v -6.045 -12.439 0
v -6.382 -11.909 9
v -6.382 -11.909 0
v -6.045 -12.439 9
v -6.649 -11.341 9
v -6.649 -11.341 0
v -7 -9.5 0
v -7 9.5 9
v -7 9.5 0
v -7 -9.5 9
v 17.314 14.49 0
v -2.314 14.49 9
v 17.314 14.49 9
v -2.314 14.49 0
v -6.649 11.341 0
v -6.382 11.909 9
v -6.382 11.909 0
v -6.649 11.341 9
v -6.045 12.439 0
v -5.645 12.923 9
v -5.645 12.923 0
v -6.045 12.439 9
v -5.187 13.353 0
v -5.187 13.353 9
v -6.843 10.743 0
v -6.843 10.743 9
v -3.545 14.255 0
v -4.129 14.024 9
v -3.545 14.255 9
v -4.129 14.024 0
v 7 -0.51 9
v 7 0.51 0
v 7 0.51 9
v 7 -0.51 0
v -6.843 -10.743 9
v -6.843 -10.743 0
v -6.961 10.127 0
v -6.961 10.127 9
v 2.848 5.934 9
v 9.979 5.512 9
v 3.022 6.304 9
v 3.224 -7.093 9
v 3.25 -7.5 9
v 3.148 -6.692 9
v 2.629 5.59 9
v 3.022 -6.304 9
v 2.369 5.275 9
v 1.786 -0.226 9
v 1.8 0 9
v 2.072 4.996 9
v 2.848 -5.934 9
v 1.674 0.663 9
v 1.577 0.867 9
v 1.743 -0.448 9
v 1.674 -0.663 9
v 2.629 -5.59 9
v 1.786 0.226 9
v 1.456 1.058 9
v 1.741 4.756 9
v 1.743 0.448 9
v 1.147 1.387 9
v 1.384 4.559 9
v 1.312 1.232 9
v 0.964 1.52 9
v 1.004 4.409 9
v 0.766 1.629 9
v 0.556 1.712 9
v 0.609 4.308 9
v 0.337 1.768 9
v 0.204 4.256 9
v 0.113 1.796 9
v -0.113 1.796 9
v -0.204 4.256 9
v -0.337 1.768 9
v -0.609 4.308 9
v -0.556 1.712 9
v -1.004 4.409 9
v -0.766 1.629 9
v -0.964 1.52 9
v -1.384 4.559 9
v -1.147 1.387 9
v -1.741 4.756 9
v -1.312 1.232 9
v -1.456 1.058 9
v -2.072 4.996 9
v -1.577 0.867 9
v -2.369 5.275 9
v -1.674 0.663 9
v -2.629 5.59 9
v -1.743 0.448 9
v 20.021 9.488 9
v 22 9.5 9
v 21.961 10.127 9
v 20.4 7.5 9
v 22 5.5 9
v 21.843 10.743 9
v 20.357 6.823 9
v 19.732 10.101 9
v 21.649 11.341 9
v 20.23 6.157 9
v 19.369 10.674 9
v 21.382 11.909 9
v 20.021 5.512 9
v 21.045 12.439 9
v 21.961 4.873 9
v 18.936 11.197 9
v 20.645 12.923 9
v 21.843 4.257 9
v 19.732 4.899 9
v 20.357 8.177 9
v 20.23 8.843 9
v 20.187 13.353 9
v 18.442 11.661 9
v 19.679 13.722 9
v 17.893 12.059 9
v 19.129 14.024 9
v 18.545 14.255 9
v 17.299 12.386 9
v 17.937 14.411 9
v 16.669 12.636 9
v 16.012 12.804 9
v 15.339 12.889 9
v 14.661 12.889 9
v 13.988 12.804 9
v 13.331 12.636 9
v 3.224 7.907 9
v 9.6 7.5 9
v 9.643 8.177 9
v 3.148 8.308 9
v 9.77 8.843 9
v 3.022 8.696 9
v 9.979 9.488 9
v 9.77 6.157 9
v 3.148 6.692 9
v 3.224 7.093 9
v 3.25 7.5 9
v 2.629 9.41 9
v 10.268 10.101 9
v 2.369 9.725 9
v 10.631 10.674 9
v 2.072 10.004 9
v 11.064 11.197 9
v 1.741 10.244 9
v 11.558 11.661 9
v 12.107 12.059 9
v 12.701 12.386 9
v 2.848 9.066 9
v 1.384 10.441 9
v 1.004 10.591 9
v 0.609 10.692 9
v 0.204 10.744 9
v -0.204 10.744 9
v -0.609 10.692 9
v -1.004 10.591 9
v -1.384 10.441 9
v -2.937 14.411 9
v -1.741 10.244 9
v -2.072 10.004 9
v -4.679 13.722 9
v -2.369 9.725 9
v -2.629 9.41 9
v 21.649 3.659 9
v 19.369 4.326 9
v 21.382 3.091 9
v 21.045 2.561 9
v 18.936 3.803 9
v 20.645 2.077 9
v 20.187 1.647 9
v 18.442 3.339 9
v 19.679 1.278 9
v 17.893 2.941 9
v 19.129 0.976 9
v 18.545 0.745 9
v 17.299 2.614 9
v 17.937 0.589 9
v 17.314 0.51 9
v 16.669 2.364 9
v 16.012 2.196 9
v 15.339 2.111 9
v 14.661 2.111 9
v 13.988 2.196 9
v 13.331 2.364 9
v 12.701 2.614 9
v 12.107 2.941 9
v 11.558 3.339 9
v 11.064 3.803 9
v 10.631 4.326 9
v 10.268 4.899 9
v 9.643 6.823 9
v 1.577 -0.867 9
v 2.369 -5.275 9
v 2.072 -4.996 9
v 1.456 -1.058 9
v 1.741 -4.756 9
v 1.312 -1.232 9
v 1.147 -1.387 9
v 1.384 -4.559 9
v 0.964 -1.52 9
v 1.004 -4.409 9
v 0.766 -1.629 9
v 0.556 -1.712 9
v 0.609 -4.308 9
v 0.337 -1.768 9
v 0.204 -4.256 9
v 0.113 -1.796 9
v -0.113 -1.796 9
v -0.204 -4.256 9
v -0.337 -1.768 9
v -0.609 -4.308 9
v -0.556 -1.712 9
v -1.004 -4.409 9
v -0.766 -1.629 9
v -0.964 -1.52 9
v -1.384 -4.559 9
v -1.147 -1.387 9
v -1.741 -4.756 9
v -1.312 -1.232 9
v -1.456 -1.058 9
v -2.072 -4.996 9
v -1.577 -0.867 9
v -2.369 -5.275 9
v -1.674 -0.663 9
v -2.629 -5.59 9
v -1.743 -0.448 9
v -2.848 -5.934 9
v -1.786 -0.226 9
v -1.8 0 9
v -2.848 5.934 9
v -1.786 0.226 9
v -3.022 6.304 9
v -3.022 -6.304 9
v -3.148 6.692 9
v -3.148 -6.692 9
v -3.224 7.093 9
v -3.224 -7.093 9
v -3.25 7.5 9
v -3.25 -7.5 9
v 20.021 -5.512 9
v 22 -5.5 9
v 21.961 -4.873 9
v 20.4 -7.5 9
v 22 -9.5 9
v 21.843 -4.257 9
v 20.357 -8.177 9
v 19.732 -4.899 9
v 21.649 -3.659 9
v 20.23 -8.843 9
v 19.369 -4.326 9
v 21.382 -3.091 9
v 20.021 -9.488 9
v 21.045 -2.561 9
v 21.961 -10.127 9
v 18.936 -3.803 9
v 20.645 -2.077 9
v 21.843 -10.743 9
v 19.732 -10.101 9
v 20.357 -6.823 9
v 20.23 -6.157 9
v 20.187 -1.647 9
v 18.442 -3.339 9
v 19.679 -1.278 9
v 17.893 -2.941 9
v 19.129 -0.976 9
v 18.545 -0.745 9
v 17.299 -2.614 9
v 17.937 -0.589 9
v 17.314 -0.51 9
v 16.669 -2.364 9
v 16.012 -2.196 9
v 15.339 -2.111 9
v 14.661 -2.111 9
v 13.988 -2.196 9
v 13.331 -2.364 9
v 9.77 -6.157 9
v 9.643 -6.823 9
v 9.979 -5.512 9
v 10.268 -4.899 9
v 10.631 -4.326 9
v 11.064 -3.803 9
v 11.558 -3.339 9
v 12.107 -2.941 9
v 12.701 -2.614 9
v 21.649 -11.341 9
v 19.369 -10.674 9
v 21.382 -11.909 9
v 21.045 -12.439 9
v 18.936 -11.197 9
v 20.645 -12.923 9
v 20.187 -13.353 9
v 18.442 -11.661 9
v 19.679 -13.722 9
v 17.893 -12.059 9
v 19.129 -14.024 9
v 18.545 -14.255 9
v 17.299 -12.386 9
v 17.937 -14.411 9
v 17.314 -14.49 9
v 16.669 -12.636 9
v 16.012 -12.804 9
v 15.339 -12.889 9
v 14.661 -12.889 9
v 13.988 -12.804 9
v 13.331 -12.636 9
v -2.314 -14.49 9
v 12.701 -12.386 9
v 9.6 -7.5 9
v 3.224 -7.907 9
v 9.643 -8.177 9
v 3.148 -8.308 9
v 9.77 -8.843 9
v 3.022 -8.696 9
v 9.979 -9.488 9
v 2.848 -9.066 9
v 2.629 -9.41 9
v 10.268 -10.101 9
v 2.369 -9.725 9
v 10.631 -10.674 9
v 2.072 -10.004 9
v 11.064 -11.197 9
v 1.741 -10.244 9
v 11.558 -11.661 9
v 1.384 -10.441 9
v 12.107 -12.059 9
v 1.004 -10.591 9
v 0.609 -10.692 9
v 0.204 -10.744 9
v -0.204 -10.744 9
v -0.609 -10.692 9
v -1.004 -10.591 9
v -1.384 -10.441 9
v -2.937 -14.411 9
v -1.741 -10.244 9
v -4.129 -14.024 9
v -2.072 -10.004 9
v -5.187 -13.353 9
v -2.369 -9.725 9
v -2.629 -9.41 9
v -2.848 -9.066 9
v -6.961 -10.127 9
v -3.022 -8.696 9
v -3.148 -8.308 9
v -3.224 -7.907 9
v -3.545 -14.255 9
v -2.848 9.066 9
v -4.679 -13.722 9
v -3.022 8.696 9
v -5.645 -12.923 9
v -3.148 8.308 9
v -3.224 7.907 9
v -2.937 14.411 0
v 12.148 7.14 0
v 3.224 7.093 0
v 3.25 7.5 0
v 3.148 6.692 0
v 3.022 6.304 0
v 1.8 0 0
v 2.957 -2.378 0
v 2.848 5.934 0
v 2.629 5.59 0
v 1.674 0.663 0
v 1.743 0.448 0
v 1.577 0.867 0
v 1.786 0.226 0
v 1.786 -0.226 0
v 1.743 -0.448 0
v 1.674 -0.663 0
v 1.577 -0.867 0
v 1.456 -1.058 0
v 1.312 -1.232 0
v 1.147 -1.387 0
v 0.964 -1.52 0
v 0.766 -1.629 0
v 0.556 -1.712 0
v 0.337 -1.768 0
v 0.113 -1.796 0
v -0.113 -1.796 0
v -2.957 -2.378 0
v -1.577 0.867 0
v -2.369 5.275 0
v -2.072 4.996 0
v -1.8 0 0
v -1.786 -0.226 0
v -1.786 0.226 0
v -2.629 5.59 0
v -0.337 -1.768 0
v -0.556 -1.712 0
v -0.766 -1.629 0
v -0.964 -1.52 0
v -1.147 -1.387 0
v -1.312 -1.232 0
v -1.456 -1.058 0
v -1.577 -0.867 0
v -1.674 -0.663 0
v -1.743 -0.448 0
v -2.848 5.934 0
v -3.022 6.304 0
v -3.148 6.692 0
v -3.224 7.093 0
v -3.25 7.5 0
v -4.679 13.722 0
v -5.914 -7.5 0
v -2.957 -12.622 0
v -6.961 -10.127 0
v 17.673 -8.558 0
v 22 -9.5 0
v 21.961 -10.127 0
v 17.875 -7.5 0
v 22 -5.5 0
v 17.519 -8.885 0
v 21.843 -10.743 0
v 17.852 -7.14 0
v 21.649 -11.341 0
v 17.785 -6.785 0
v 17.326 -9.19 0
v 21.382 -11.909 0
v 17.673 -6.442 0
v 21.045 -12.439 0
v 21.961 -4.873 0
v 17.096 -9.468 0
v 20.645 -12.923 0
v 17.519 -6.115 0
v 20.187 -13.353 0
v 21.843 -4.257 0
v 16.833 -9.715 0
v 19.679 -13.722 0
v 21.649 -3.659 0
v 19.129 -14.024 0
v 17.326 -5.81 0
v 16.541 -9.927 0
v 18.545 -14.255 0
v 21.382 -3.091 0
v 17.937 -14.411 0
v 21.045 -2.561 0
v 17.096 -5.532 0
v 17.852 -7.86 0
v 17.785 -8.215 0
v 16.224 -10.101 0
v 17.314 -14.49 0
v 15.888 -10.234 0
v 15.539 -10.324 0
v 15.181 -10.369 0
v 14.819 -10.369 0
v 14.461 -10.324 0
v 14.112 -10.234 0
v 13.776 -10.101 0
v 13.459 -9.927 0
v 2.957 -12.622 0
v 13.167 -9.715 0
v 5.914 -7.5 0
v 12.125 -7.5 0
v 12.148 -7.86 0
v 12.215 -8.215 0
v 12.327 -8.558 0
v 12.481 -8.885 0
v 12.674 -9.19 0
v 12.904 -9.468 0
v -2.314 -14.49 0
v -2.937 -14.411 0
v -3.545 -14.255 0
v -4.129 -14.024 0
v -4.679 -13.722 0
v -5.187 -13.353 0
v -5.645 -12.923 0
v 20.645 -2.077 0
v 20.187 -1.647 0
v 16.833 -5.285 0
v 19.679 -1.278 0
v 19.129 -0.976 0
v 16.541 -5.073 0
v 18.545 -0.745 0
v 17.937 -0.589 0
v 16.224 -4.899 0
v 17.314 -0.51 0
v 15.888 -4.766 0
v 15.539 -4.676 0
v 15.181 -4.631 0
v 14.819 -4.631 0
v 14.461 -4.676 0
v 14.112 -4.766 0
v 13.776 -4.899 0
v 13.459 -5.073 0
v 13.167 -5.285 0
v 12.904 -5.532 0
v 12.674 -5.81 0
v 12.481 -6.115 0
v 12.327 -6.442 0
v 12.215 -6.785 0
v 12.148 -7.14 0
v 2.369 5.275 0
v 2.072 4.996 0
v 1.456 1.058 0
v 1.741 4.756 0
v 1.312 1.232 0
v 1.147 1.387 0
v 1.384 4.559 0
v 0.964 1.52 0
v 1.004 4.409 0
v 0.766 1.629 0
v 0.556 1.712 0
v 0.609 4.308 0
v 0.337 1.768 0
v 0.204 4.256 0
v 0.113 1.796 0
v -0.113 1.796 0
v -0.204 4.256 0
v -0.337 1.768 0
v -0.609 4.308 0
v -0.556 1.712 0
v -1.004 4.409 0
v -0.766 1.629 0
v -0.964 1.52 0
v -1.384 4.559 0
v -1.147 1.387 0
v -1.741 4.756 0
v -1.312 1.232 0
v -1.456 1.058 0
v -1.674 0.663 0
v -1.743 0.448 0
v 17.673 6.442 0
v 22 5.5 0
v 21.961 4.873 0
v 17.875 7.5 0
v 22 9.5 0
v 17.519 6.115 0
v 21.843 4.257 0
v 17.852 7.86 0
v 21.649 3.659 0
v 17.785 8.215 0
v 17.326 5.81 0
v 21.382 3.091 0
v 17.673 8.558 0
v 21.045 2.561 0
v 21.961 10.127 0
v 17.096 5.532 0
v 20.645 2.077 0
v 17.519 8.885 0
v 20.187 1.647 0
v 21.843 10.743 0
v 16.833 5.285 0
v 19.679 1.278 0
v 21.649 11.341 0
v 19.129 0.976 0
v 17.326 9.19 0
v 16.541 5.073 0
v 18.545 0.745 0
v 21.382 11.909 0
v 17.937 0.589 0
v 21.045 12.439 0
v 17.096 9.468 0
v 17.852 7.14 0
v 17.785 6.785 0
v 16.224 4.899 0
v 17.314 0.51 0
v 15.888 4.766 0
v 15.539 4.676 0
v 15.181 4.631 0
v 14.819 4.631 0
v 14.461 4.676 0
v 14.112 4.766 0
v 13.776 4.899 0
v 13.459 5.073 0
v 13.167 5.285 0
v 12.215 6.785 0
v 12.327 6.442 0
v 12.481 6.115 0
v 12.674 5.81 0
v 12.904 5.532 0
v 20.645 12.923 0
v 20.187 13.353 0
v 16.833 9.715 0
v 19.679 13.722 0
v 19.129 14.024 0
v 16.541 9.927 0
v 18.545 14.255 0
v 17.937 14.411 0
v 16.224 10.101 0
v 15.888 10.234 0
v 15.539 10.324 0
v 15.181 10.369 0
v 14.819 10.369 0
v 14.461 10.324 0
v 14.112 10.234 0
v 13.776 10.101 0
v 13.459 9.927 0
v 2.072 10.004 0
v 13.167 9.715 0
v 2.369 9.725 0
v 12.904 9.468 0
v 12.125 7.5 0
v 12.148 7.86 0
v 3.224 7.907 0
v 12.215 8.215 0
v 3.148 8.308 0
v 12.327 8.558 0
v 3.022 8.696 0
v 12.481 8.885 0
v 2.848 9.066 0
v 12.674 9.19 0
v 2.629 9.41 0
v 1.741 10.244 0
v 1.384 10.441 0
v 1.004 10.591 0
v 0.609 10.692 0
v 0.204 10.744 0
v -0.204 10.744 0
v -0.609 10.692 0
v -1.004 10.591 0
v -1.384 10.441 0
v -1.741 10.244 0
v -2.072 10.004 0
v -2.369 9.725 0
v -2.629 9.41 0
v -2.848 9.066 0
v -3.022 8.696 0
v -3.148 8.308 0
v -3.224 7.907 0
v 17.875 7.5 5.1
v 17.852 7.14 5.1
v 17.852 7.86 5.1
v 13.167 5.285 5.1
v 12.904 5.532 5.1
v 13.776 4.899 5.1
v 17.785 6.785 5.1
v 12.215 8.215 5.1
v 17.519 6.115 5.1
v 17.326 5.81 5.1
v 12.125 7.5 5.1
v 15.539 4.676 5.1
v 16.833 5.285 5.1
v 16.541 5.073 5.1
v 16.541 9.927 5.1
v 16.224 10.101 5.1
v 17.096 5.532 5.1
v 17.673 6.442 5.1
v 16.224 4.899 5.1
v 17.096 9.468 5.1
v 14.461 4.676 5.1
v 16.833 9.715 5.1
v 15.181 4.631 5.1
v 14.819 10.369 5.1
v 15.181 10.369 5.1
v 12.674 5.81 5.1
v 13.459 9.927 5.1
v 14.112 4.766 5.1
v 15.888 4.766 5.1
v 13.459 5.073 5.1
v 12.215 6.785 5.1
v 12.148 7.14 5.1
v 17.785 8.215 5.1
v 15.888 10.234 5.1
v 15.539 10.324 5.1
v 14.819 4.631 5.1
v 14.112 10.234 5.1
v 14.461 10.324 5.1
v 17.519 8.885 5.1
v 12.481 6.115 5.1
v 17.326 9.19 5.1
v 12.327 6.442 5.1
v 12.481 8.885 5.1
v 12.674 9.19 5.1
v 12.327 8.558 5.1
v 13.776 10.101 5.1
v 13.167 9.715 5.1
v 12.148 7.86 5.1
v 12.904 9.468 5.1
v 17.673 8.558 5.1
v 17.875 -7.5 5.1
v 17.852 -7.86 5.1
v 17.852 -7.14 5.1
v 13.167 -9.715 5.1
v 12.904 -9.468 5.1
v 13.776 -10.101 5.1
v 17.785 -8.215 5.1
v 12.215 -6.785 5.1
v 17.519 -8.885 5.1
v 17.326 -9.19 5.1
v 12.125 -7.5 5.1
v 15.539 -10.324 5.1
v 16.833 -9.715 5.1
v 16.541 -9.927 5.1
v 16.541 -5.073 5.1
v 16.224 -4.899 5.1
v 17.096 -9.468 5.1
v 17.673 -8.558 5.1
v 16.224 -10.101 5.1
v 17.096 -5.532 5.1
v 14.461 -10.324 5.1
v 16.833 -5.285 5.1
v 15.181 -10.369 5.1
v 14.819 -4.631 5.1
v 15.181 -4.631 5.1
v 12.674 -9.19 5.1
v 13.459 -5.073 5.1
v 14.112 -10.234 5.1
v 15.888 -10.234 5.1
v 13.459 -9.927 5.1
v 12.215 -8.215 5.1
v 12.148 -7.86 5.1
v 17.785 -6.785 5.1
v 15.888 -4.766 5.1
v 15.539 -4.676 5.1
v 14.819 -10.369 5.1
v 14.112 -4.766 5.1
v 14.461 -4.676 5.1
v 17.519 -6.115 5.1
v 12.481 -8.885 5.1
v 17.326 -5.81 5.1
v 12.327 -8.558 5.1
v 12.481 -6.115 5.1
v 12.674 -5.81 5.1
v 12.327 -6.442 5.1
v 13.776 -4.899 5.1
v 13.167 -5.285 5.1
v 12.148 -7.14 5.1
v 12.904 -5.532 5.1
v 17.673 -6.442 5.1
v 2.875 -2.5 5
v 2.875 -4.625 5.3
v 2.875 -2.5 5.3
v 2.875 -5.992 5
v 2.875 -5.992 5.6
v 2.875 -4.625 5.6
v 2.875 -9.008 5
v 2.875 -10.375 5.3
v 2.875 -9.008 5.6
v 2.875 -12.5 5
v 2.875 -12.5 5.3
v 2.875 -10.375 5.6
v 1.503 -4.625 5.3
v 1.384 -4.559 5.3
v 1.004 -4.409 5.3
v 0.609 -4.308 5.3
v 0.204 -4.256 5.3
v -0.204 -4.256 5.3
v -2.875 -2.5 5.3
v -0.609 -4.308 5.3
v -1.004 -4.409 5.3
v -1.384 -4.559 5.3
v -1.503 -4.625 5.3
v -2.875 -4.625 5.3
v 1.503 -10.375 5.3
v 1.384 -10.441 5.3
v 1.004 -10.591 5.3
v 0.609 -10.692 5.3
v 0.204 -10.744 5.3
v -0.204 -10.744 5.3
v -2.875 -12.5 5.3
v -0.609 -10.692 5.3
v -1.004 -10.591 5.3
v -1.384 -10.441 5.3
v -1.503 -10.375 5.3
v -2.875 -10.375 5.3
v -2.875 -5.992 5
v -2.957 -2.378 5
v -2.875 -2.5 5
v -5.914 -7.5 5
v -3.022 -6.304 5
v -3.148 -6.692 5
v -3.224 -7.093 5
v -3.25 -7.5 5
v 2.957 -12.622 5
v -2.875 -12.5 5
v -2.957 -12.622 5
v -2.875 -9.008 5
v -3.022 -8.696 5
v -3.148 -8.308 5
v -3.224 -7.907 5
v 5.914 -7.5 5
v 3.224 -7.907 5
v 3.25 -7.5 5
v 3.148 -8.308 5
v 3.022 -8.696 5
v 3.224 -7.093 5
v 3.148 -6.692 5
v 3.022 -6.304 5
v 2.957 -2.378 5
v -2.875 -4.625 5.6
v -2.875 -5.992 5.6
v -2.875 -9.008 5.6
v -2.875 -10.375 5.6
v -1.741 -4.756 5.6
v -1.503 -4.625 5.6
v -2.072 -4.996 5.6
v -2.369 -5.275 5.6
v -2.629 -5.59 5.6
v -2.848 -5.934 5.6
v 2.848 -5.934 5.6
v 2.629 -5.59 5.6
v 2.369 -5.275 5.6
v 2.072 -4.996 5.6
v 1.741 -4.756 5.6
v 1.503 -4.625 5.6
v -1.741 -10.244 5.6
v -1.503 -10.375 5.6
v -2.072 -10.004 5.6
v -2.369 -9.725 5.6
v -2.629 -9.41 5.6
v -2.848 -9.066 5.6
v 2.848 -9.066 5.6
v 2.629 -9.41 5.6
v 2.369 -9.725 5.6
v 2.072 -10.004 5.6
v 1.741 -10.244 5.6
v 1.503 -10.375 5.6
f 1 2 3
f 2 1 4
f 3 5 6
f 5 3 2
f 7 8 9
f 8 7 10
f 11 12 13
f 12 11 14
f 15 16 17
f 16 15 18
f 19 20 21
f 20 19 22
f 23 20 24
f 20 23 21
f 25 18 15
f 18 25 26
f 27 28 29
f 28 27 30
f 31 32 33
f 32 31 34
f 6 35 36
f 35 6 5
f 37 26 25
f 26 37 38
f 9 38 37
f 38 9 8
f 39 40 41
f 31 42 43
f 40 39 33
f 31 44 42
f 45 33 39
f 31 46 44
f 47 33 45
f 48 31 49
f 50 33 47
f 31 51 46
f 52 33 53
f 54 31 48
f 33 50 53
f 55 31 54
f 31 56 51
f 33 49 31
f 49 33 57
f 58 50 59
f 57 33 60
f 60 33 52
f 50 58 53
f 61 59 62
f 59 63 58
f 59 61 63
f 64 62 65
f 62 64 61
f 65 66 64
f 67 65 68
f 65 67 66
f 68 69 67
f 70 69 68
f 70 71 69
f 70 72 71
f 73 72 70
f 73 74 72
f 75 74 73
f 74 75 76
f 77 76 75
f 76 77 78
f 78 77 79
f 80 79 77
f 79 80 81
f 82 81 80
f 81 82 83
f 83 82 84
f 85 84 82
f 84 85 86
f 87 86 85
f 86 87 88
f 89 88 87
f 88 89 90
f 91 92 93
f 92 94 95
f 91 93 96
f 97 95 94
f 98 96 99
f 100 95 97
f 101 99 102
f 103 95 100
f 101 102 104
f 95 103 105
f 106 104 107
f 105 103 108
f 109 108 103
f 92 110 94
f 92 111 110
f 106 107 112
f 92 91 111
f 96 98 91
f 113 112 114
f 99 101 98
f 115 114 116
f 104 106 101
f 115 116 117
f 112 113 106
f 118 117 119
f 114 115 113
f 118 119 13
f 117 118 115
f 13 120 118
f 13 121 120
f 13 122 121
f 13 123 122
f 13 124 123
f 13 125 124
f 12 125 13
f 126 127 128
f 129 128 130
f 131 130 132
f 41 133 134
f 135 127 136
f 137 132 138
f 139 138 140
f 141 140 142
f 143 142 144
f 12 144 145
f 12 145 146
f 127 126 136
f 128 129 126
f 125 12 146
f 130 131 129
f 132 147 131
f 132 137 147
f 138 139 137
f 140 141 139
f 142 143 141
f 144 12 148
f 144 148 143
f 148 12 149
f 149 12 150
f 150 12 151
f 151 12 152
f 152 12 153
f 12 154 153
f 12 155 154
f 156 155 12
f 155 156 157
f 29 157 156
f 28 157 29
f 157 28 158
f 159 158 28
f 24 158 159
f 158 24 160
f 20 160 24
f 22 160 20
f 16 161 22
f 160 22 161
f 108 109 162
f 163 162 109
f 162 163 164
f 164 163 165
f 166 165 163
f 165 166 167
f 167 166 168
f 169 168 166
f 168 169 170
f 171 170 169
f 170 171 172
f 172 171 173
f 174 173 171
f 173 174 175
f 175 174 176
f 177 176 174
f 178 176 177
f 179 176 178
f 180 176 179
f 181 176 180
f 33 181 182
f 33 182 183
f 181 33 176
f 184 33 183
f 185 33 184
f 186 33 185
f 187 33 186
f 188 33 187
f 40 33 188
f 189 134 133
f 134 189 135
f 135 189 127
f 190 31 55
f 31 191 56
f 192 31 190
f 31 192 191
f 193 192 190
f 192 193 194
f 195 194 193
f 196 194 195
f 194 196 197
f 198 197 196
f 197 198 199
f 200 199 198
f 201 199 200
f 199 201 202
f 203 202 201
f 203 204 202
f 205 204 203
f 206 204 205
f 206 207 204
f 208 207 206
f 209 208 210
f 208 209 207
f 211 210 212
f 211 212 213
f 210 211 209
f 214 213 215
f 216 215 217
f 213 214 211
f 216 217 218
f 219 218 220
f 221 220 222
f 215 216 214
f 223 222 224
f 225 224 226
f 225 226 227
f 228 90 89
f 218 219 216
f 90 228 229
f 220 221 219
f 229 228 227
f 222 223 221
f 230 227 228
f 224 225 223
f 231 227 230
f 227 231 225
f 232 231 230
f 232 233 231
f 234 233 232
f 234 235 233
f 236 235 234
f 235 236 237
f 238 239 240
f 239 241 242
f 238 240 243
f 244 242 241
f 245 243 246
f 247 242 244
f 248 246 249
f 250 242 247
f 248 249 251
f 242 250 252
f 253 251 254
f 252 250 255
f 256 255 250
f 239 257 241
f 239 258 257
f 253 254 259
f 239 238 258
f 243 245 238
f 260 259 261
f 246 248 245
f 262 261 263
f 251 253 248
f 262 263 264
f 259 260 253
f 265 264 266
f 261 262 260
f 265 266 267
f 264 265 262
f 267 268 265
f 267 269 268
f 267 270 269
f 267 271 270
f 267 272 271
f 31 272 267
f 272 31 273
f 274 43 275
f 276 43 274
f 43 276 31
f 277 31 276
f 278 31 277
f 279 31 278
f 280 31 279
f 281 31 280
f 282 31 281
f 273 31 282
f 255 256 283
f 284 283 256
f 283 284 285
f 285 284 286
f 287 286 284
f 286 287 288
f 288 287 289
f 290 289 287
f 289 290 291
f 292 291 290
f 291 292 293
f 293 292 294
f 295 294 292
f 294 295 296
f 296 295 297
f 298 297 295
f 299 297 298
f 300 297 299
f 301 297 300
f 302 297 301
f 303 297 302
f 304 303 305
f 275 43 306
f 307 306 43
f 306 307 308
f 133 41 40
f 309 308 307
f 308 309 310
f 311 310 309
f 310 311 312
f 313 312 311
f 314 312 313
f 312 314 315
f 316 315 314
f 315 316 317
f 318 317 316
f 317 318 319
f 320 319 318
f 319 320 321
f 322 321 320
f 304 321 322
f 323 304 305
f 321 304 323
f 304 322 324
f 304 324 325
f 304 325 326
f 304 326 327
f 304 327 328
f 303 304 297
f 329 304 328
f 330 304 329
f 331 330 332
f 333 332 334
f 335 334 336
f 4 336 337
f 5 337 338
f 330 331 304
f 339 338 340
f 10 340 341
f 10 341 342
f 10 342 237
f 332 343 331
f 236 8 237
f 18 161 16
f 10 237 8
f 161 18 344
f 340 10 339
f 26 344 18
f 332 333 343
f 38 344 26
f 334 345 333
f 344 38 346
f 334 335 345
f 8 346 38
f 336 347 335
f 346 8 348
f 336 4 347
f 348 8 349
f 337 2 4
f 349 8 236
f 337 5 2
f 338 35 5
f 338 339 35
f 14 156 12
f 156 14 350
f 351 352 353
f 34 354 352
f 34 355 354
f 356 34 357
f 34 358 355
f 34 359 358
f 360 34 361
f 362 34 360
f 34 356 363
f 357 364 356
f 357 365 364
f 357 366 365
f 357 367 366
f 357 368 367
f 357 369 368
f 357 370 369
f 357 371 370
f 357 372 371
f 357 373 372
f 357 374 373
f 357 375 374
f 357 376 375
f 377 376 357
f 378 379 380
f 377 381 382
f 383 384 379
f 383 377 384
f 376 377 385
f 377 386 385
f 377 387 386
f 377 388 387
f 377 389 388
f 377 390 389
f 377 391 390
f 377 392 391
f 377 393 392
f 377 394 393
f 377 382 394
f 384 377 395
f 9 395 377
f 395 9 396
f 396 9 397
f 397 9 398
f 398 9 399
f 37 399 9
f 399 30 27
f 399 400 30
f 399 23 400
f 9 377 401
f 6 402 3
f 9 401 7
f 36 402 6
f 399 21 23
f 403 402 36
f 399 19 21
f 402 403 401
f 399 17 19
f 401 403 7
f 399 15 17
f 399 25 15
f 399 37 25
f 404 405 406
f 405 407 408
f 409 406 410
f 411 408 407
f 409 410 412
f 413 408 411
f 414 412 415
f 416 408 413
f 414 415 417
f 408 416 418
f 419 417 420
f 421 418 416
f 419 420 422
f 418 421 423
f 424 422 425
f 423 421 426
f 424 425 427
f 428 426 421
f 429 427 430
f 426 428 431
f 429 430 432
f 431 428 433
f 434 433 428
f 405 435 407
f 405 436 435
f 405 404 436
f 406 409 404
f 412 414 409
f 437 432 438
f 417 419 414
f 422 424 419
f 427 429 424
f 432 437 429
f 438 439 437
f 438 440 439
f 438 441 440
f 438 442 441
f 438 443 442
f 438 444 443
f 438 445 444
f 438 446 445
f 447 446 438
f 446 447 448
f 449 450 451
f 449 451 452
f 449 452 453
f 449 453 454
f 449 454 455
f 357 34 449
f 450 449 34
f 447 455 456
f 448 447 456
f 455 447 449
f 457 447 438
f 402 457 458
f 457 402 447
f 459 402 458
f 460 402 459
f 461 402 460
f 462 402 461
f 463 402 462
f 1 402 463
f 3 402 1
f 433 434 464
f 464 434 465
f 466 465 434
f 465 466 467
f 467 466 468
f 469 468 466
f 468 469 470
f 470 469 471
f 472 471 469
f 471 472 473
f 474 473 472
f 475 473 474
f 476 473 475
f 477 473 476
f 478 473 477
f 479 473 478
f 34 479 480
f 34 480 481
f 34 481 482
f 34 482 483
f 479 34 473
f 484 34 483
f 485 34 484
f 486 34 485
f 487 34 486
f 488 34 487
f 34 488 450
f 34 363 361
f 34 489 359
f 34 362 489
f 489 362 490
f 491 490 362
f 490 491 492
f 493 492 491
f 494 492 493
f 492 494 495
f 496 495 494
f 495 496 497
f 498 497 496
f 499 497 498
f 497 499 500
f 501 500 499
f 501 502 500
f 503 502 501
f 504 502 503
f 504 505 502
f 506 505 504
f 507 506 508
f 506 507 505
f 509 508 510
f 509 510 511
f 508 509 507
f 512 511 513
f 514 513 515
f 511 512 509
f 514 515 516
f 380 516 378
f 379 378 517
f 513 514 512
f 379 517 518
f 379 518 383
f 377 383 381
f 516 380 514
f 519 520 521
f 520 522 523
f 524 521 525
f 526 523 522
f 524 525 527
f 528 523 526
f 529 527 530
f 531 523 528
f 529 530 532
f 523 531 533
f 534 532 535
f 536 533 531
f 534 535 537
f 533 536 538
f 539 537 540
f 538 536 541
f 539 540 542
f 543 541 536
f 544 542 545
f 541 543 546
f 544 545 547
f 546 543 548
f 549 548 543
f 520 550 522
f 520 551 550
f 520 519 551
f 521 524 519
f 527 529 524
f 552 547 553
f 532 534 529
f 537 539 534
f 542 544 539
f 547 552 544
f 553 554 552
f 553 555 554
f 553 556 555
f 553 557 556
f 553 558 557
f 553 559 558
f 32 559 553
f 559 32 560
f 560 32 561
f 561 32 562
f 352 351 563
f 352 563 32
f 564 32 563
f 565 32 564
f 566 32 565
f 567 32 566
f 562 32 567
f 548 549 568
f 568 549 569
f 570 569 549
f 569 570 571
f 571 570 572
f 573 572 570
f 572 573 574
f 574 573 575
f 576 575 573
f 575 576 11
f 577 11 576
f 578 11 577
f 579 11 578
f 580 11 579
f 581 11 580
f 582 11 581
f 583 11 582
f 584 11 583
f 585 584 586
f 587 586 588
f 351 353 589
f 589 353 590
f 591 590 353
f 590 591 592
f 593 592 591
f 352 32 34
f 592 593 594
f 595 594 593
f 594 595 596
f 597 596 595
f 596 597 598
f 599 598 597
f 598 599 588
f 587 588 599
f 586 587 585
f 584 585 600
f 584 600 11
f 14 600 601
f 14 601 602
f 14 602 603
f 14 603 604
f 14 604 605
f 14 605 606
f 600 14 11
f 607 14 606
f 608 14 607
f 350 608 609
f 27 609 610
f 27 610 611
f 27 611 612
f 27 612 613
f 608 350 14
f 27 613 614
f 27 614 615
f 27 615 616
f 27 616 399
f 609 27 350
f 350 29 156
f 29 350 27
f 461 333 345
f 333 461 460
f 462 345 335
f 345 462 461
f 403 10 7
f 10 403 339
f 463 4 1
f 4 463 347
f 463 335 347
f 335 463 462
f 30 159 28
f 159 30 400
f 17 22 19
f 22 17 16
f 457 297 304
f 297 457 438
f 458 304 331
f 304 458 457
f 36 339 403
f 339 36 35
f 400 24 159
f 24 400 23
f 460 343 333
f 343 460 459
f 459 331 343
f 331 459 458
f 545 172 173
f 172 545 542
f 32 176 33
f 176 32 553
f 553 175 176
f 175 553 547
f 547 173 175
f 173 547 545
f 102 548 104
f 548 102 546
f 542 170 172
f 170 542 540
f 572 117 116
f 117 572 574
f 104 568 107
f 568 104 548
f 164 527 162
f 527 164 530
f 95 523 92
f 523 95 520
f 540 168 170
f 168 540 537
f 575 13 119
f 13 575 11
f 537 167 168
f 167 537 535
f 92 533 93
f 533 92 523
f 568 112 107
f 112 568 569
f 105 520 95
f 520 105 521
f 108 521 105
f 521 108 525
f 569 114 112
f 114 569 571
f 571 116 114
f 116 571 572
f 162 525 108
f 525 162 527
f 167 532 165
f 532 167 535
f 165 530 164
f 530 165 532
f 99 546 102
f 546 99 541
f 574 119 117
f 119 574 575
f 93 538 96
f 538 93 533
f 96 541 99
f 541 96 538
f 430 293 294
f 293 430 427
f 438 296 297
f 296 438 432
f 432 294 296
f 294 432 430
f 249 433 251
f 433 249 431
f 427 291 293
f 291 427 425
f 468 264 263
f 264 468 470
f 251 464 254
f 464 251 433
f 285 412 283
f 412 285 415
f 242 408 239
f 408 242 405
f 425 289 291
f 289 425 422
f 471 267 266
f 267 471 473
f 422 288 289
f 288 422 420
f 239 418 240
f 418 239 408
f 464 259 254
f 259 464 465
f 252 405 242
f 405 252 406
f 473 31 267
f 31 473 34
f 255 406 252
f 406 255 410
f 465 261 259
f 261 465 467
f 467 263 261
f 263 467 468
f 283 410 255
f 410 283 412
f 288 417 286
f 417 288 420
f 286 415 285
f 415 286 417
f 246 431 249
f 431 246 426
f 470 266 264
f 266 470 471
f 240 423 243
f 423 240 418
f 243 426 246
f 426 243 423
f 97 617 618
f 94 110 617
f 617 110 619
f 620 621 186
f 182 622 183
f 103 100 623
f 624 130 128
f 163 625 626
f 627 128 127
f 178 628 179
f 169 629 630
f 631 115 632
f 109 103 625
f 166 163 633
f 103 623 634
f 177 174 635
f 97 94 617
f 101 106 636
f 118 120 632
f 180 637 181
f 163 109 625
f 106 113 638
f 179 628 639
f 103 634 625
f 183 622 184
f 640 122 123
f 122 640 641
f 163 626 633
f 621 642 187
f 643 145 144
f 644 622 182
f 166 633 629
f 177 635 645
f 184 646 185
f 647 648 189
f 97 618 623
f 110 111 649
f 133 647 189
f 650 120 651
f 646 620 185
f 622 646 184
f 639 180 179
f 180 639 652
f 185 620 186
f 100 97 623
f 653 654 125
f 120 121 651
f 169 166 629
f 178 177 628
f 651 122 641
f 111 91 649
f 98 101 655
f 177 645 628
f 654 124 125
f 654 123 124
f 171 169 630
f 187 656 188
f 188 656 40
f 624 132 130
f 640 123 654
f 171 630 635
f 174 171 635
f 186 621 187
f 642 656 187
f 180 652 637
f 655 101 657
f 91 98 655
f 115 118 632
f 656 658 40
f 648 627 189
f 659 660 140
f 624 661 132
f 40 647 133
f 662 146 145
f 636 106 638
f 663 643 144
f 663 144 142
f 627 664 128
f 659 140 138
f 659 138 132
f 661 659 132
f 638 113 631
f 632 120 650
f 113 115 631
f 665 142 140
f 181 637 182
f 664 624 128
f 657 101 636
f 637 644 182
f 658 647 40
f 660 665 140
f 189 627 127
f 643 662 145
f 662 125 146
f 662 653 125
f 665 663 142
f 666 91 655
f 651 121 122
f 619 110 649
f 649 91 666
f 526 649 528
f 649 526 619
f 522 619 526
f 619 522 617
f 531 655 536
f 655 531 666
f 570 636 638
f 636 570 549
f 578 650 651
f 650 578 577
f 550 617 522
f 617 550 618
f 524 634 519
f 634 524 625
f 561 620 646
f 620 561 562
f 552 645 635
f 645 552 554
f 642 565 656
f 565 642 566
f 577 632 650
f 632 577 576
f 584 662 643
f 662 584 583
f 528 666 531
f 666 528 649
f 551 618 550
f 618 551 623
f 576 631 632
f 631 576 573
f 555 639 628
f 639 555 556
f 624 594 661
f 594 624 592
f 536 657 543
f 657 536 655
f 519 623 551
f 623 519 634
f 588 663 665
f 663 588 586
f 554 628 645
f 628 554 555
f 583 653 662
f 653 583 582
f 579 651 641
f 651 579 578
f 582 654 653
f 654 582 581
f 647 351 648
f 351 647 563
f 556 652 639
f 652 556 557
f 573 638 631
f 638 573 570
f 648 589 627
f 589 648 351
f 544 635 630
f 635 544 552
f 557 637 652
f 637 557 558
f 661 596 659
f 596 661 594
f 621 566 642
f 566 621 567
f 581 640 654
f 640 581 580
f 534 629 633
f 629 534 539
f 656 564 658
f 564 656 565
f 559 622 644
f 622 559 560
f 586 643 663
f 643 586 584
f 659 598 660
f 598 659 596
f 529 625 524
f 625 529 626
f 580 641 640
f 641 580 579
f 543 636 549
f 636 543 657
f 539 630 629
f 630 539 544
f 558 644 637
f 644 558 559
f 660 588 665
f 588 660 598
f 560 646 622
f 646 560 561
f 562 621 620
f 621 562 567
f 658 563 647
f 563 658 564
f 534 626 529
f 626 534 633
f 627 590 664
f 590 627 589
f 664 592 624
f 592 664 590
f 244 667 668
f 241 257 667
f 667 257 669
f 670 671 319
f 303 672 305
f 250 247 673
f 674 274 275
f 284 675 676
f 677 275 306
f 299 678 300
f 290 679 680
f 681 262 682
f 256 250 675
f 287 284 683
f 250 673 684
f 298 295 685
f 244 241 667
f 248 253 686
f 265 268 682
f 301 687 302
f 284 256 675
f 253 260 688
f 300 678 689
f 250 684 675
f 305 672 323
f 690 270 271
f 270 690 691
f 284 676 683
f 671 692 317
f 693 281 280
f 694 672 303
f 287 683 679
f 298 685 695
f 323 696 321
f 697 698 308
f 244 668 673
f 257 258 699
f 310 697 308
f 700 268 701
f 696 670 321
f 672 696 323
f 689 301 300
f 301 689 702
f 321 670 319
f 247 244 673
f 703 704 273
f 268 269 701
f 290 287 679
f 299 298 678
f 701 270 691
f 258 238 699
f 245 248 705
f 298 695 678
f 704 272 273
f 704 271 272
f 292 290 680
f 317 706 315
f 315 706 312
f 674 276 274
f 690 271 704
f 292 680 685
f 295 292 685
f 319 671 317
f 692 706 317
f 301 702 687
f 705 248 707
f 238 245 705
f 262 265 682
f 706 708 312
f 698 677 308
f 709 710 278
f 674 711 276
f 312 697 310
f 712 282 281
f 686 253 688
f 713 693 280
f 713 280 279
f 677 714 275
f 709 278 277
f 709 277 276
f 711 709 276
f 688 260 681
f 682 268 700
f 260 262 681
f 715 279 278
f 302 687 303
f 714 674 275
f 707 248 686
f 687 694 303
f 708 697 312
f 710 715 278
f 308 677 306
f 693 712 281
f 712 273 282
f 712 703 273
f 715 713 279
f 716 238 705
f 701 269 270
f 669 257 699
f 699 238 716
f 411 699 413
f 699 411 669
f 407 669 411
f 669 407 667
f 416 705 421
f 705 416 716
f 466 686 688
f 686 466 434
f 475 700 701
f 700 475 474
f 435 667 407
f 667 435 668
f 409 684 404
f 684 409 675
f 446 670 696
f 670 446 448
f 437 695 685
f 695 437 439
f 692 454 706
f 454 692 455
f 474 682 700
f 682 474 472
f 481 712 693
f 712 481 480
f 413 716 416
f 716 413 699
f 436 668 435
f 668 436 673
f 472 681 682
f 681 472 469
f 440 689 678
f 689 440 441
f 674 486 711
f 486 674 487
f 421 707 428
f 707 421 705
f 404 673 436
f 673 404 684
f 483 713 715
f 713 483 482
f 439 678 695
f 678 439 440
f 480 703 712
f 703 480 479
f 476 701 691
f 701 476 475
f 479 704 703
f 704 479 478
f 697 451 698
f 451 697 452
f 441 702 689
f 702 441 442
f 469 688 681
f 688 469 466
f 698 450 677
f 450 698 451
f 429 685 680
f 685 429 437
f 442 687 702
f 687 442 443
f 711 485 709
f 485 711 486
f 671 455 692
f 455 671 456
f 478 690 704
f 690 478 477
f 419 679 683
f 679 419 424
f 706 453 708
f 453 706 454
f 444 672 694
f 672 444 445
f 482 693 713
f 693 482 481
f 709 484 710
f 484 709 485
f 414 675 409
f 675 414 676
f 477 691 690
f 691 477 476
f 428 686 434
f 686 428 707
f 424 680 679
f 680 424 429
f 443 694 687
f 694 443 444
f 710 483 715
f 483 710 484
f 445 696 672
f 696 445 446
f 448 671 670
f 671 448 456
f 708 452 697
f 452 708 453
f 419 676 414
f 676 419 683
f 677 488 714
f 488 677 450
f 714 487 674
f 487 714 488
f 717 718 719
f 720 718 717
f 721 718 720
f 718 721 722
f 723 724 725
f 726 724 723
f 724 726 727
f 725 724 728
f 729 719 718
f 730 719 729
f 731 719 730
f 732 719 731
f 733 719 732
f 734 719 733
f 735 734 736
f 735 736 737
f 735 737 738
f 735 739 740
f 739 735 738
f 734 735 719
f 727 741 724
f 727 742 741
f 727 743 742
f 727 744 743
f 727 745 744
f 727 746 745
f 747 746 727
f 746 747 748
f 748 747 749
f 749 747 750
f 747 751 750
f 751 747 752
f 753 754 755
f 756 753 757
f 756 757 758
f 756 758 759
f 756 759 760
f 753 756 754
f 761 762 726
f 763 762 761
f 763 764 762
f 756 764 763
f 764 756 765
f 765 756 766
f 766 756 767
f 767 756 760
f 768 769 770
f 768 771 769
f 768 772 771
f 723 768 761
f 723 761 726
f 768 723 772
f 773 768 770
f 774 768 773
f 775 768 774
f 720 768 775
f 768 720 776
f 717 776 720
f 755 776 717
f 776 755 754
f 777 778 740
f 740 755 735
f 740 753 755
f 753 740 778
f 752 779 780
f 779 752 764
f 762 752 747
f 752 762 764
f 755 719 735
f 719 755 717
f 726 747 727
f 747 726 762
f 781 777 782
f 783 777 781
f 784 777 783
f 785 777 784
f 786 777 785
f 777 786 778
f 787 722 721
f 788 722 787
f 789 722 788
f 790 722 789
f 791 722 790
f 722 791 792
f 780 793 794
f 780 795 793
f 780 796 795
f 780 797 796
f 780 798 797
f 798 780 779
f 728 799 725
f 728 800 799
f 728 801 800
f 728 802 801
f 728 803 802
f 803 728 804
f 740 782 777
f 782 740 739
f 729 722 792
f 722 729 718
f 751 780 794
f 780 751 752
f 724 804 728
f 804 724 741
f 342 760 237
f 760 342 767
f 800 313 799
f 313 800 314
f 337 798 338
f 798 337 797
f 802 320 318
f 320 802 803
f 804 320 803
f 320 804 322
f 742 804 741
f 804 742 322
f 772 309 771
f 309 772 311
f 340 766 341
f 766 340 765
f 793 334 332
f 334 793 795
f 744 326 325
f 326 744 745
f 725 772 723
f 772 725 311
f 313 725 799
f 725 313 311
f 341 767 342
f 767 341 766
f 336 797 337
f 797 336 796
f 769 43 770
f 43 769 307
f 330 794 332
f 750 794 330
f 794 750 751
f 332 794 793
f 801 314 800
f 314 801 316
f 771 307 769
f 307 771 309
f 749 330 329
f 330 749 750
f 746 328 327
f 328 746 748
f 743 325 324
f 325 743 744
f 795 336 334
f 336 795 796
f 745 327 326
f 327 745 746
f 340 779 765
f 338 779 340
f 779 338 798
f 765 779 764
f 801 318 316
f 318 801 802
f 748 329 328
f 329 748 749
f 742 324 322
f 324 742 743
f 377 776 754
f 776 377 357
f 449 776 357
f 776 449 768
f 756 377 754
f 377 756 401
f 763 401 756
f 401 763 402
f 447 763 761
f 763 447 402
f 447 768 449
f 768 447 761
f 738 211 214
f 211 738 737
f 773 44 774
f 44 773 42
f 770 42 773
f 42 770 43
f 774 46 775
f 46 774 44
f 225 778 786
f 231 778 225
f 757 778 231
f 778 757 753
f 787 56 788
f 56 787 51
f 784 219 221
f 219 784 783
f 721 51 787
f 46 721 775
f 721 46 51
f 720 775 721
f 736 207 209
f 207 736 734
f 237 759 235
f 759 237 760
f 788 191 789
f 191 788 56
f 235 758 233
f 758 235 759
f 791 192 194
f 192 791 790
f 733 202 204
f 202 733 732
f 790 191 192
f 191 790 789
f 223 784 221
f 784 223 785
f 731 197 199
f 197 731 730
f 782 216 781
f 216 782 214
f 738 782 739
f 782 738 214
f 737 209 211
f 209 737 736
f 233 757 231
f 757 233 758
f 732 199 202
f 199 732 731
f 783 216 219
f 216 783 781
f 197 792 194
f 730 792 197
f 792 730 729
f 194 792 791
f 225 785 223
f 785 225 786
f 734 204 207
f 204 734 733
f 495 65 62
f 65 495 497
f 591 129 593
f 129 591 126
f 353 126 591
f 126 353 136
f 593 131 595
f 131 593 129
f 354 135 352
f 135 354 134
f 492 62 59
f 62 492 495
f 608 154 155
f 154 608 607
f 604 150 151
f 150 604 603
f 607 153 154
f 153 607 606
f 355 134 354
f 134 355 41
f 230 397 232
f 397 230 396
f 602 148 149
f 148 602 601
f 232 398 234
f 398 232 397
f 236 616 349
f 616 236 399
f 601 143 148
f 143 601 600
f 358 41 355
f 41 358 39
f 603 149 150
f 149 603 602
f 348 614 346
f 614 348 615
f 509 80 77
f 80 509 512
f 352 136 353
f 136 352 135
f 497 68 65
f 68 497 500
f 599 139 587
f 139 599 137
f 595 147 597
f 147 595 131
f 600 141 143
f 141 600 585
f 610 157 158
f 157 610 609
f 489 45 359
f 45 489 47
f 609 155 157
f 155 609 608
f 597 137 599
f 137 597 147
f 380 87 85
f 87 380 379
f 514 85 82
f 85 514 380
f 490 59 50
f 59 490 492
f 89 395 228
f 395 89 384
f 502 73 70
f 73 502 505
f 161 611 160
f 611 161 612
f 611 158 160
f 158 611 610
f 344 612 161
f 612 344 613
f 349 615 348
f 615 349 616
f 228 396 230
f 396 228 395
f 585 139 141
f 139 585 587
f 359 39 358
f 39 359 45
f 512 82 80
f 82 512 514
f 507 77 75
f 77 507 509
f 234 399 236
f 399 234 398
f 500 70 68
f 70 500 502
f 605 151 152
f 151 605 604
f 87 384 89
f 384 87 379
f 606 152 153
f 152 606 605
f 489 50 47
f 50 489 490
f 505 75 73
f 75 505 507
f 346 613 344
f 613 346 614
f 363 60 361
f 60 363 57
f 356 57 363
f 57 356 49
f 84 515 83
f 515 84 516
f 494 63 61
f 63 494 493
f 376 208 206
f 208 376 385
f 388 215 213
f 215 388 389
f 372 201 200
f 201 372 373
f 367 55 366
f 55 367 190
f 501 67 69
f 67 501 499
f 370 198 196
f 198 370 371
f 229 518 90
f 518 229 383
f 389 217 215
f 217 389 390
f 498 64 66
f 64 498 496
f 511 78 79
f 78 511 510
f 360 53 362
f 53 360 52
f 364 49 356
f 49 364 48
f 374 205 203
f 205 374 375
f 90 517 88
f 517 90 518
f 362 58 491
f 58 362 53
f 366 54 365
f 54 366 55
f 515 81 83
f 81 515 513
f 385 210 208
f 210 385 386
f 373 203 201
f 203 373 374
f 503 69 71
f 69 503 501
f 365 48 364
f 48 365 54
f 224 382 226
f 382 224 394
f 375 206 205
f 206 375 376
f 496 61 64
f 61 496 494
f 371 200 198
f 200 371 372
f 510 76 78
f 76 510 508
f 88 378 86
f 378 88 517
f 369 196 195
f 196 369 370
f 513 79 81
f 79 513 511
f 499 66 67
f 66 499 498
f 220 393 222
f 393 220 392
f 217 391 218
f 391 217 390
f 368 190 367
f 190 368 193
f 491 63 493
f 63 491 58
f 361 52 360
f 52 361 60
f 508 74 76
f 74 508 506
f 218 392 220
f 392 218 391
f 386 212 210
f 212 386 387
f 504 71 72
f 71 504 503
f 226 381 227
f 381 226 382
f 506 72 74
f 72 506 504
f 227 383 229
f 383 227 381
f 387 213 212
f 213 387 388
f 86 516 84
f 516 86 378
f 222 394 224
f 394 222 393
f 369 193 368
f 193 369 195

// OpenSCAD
$fn = 50;


difference() {
	union() {
		hull() {
			translate(v = [-2.0000000000, 9.5000000000, 0]) {
				cylinder(h = 9, r = 5);
			}
			translate(v = [2.0000000000, 9.5000000000, 0]) {
				cylinder(h = 9, r = 5);
			}
			translate(v = [-2.0000000000, -9.5000000000, 0]) {
				cylinder(h = 9, r = 5);
			}
			translate(v = [2.0000000000, -9.5000000000, 0]) {
				cylinder(h = 9, r = 5);
			}
		}
		translate(v = [7.5000000000, 7.5000000000, 0]) {
			hull() {
				translate(v = [-9.5000000000, 2.0000000000, 0]) {
					cylinder(h = 9, r = 5);
				}
				translate(v = [9.5000000000, 2.0000000000, 0]) {
					cylinder(h = 9, r = 5);
				}
				translate(v = [-9.5000000000, -2.0000000000, 0]) {
					cylinder(h = 9, r = 5);
				}
				translate(v = [9.5000000000, -2.0000000000, 0]) {
					cylinder(h = 9, r = 5);
				}
			}
		}
		translate(v = [7.5000000000, -7.5000000000, 0]) {
			hull() {
				translate(v = [-9.5000000000, 2.0000000000, 0]) {
					cylinder(h = 9, r = 5);
				}
				translate(v = [9.5000000000, 2.0000000000, 0]) {
					cylinder(h = 9, r = 5);
				}
				translate(v = [-9.5000000000, -2.0000000000, 0]) {
					cylinder(h = 9, r = 5);
				}
				translate(v = [9.5000000000, -2.0000000000, 0]) {
					cylinder(h = 9, r = 5);
				}
			}
		}
	}
	union() {
		translate(v = [15.0000000000, 7.5000000000, 9]) {
			rotate(a = [0, 0, 0]) {
				difference() {
					union() {
						#translate(v = [0, 0, -9.0000000000]) {
							cylinder(h = 9, r = 2.6000000000);
						}
						#translate(v = [0, 0, -3.9000000000]) {
							cylinder(h = 3.9000000000, r1 = 2.8750000000, r2 = 5.4000000000);
						}
						#translate(v = [0, 0, -9.0000000000]) {
							cylinder(h = 9, r = 2.8750000000);
						}
						#translate(v = [0, 0, -9.0000000000]) {
							cylinder(h = 9, r = 2.6000000000);
						}
					}
					union();
				}
			}
		}
		translate(v = [15.0000000000, -7.5000000000, 9]) {
			rotate(a = [0, 0, 0]) {
				difference() {
					union() {
						#translate(v = [0, 0, -9.0000000000]) {
							cylinder(h = 9, r = 2.6000000000);
						}
						#translate(v = [0, 0, -3.9000000000]) {
							cylinder(h = 3.9000000000, r1 = 2.8750000000, r2 = 5.4000000000);
						}
						#translate(v = [0, 0, -9.0000000000]) {
							cylinder(h = 9, r = 2.8750000000);
						}
						#translate(v = [0, 0, -9.0000000000]) {
							cylinder(h = 9, r = 2.6000000000);
						}
					}
					union();
				}
			}
		}
		translate(v = [0.0000000000, -7.5000000000, 0]) {
			rotate(a = [0, 0, 0]) {
				difference() {
					union() {
						#translate(v = [-2.8750000000, -5.0000000000, -0.3000000000]) {
							cube(size = [5.7500000000, 10, 0.3000000000]);
						}
						#translate(v = [-2.8750000000, -2.8750000000, -0.6000000000]) {
							cube(size = [5.7500000000, 5.7500000000, 0.3000000000]);
						}
						#translate(v = [-2.8750000000, -5.0000000000, 5]) {
							cube(size = [5.7500000000, 10, 0.3000000000]);
						}
						#translate(v = [-2.8750000000, -2.8750000000, 5.3000000000]) {
							cube(size = [5.7500000000, 5.7500000000, 0.3000000000]);
						}
						#translate(v = [0, 0, -100.0000000000]) {
							cylinder(h = 200, r = 3.2500000000);
						}
						#linear_extrude(height = 5) {
							polygon(points = [[5.9142500000, 0.0000000000], [2.9571250000, 5.1218907443], [-2.9571250000, 5.1218907443], [-5.9142500000, 0.0000000000], [-2.9571250000, -5.1218907443], [2.9571250000, -5.1218907443]]);
						}
						#translate(v = [-2.8750000000, -5.0000000000, -0.3000000000]) {
							cube(size = [5.7500000000, 10, 0.3000000000]);
						}
						#translate(v = [-2.8750000000, -2.8750000000, -0.6000000000]) {
							cube(size = [5.7500000000, 5.7500000000, 0.3000000000]);
						}
						#translate(v = [-2.8750000000, -5.0000000000, 5]) {
							cube(size = [5.7500000000, 10, 0.3000000000]);
						}
						#translate(v = [-2.8750000000, -2.8750000000, 5.3000000000]) {
							cube(size = [5.7500000000, 5.7500000000, 0.3000000000]);
						}
						#translate(v = [0, 0, -100.0000000000]) {
							cylinder(h = 200, r = 3.2500000000);
						}
						#translate(v = [-2.8750000000, -5.0000000000, -0.3000000000]) {
							cube(size = [5.7500000000, 10, 0.3000000000]);
						}
						#translate(v = [-2.8750000000, -2.8750000000, -0.6000000000]) {
							cube(size = [5.7500000000, 5.7500000000, 0.3000000000]);
						}
						#translate(v = [-2.8750000000, -5.0000000000, 5]) {
							cube(size = [5.7500000000, 10, 0.3000000000]);
						}
						#translate(v = [-2.8750000000, -2.8750000000, 5.3000000000]) {
							cube(size = [5.7500000000, 5.7500000000, 0.3000000000]);
						}
						#translate(v = [0, 0, -100.0000000000]) {
							cylinder(h = 200, r = 3.2500000000);
						}
					}
					union();
				}
			}
		}
		translate(v = [0.0000000000, -7.5000000000, 0]) {
			translate(v = [0, 0, -100]) {
				cylinder(h = 200, r = 3.2500000000);
			}
		}
		translate(v = [0.0000000000, 7.5000000000, 0]) {
			translate(v = [0, 0, -100]) {
				cylinder(h = 200, r = 3.2500000000);
			}
		}
		translate(v = [0.0000000000, -7.5000000000, 0]) {
			translate(v = [0, 0, -100]) {
				cylinder(h = 200, r = 1.8000000000);
			}
		}
		translate(v = [0, 0, -100]) {
			cylinder(h = 200, r = 1.8000000000);
		}
		translate(v = [0.0000000000, 7.5000000000, 0]) {
			translate(v = [0, 0, -100]) {
				cylinder(h = 200, r = 1.8000000000);
			}
		}
	}
}
